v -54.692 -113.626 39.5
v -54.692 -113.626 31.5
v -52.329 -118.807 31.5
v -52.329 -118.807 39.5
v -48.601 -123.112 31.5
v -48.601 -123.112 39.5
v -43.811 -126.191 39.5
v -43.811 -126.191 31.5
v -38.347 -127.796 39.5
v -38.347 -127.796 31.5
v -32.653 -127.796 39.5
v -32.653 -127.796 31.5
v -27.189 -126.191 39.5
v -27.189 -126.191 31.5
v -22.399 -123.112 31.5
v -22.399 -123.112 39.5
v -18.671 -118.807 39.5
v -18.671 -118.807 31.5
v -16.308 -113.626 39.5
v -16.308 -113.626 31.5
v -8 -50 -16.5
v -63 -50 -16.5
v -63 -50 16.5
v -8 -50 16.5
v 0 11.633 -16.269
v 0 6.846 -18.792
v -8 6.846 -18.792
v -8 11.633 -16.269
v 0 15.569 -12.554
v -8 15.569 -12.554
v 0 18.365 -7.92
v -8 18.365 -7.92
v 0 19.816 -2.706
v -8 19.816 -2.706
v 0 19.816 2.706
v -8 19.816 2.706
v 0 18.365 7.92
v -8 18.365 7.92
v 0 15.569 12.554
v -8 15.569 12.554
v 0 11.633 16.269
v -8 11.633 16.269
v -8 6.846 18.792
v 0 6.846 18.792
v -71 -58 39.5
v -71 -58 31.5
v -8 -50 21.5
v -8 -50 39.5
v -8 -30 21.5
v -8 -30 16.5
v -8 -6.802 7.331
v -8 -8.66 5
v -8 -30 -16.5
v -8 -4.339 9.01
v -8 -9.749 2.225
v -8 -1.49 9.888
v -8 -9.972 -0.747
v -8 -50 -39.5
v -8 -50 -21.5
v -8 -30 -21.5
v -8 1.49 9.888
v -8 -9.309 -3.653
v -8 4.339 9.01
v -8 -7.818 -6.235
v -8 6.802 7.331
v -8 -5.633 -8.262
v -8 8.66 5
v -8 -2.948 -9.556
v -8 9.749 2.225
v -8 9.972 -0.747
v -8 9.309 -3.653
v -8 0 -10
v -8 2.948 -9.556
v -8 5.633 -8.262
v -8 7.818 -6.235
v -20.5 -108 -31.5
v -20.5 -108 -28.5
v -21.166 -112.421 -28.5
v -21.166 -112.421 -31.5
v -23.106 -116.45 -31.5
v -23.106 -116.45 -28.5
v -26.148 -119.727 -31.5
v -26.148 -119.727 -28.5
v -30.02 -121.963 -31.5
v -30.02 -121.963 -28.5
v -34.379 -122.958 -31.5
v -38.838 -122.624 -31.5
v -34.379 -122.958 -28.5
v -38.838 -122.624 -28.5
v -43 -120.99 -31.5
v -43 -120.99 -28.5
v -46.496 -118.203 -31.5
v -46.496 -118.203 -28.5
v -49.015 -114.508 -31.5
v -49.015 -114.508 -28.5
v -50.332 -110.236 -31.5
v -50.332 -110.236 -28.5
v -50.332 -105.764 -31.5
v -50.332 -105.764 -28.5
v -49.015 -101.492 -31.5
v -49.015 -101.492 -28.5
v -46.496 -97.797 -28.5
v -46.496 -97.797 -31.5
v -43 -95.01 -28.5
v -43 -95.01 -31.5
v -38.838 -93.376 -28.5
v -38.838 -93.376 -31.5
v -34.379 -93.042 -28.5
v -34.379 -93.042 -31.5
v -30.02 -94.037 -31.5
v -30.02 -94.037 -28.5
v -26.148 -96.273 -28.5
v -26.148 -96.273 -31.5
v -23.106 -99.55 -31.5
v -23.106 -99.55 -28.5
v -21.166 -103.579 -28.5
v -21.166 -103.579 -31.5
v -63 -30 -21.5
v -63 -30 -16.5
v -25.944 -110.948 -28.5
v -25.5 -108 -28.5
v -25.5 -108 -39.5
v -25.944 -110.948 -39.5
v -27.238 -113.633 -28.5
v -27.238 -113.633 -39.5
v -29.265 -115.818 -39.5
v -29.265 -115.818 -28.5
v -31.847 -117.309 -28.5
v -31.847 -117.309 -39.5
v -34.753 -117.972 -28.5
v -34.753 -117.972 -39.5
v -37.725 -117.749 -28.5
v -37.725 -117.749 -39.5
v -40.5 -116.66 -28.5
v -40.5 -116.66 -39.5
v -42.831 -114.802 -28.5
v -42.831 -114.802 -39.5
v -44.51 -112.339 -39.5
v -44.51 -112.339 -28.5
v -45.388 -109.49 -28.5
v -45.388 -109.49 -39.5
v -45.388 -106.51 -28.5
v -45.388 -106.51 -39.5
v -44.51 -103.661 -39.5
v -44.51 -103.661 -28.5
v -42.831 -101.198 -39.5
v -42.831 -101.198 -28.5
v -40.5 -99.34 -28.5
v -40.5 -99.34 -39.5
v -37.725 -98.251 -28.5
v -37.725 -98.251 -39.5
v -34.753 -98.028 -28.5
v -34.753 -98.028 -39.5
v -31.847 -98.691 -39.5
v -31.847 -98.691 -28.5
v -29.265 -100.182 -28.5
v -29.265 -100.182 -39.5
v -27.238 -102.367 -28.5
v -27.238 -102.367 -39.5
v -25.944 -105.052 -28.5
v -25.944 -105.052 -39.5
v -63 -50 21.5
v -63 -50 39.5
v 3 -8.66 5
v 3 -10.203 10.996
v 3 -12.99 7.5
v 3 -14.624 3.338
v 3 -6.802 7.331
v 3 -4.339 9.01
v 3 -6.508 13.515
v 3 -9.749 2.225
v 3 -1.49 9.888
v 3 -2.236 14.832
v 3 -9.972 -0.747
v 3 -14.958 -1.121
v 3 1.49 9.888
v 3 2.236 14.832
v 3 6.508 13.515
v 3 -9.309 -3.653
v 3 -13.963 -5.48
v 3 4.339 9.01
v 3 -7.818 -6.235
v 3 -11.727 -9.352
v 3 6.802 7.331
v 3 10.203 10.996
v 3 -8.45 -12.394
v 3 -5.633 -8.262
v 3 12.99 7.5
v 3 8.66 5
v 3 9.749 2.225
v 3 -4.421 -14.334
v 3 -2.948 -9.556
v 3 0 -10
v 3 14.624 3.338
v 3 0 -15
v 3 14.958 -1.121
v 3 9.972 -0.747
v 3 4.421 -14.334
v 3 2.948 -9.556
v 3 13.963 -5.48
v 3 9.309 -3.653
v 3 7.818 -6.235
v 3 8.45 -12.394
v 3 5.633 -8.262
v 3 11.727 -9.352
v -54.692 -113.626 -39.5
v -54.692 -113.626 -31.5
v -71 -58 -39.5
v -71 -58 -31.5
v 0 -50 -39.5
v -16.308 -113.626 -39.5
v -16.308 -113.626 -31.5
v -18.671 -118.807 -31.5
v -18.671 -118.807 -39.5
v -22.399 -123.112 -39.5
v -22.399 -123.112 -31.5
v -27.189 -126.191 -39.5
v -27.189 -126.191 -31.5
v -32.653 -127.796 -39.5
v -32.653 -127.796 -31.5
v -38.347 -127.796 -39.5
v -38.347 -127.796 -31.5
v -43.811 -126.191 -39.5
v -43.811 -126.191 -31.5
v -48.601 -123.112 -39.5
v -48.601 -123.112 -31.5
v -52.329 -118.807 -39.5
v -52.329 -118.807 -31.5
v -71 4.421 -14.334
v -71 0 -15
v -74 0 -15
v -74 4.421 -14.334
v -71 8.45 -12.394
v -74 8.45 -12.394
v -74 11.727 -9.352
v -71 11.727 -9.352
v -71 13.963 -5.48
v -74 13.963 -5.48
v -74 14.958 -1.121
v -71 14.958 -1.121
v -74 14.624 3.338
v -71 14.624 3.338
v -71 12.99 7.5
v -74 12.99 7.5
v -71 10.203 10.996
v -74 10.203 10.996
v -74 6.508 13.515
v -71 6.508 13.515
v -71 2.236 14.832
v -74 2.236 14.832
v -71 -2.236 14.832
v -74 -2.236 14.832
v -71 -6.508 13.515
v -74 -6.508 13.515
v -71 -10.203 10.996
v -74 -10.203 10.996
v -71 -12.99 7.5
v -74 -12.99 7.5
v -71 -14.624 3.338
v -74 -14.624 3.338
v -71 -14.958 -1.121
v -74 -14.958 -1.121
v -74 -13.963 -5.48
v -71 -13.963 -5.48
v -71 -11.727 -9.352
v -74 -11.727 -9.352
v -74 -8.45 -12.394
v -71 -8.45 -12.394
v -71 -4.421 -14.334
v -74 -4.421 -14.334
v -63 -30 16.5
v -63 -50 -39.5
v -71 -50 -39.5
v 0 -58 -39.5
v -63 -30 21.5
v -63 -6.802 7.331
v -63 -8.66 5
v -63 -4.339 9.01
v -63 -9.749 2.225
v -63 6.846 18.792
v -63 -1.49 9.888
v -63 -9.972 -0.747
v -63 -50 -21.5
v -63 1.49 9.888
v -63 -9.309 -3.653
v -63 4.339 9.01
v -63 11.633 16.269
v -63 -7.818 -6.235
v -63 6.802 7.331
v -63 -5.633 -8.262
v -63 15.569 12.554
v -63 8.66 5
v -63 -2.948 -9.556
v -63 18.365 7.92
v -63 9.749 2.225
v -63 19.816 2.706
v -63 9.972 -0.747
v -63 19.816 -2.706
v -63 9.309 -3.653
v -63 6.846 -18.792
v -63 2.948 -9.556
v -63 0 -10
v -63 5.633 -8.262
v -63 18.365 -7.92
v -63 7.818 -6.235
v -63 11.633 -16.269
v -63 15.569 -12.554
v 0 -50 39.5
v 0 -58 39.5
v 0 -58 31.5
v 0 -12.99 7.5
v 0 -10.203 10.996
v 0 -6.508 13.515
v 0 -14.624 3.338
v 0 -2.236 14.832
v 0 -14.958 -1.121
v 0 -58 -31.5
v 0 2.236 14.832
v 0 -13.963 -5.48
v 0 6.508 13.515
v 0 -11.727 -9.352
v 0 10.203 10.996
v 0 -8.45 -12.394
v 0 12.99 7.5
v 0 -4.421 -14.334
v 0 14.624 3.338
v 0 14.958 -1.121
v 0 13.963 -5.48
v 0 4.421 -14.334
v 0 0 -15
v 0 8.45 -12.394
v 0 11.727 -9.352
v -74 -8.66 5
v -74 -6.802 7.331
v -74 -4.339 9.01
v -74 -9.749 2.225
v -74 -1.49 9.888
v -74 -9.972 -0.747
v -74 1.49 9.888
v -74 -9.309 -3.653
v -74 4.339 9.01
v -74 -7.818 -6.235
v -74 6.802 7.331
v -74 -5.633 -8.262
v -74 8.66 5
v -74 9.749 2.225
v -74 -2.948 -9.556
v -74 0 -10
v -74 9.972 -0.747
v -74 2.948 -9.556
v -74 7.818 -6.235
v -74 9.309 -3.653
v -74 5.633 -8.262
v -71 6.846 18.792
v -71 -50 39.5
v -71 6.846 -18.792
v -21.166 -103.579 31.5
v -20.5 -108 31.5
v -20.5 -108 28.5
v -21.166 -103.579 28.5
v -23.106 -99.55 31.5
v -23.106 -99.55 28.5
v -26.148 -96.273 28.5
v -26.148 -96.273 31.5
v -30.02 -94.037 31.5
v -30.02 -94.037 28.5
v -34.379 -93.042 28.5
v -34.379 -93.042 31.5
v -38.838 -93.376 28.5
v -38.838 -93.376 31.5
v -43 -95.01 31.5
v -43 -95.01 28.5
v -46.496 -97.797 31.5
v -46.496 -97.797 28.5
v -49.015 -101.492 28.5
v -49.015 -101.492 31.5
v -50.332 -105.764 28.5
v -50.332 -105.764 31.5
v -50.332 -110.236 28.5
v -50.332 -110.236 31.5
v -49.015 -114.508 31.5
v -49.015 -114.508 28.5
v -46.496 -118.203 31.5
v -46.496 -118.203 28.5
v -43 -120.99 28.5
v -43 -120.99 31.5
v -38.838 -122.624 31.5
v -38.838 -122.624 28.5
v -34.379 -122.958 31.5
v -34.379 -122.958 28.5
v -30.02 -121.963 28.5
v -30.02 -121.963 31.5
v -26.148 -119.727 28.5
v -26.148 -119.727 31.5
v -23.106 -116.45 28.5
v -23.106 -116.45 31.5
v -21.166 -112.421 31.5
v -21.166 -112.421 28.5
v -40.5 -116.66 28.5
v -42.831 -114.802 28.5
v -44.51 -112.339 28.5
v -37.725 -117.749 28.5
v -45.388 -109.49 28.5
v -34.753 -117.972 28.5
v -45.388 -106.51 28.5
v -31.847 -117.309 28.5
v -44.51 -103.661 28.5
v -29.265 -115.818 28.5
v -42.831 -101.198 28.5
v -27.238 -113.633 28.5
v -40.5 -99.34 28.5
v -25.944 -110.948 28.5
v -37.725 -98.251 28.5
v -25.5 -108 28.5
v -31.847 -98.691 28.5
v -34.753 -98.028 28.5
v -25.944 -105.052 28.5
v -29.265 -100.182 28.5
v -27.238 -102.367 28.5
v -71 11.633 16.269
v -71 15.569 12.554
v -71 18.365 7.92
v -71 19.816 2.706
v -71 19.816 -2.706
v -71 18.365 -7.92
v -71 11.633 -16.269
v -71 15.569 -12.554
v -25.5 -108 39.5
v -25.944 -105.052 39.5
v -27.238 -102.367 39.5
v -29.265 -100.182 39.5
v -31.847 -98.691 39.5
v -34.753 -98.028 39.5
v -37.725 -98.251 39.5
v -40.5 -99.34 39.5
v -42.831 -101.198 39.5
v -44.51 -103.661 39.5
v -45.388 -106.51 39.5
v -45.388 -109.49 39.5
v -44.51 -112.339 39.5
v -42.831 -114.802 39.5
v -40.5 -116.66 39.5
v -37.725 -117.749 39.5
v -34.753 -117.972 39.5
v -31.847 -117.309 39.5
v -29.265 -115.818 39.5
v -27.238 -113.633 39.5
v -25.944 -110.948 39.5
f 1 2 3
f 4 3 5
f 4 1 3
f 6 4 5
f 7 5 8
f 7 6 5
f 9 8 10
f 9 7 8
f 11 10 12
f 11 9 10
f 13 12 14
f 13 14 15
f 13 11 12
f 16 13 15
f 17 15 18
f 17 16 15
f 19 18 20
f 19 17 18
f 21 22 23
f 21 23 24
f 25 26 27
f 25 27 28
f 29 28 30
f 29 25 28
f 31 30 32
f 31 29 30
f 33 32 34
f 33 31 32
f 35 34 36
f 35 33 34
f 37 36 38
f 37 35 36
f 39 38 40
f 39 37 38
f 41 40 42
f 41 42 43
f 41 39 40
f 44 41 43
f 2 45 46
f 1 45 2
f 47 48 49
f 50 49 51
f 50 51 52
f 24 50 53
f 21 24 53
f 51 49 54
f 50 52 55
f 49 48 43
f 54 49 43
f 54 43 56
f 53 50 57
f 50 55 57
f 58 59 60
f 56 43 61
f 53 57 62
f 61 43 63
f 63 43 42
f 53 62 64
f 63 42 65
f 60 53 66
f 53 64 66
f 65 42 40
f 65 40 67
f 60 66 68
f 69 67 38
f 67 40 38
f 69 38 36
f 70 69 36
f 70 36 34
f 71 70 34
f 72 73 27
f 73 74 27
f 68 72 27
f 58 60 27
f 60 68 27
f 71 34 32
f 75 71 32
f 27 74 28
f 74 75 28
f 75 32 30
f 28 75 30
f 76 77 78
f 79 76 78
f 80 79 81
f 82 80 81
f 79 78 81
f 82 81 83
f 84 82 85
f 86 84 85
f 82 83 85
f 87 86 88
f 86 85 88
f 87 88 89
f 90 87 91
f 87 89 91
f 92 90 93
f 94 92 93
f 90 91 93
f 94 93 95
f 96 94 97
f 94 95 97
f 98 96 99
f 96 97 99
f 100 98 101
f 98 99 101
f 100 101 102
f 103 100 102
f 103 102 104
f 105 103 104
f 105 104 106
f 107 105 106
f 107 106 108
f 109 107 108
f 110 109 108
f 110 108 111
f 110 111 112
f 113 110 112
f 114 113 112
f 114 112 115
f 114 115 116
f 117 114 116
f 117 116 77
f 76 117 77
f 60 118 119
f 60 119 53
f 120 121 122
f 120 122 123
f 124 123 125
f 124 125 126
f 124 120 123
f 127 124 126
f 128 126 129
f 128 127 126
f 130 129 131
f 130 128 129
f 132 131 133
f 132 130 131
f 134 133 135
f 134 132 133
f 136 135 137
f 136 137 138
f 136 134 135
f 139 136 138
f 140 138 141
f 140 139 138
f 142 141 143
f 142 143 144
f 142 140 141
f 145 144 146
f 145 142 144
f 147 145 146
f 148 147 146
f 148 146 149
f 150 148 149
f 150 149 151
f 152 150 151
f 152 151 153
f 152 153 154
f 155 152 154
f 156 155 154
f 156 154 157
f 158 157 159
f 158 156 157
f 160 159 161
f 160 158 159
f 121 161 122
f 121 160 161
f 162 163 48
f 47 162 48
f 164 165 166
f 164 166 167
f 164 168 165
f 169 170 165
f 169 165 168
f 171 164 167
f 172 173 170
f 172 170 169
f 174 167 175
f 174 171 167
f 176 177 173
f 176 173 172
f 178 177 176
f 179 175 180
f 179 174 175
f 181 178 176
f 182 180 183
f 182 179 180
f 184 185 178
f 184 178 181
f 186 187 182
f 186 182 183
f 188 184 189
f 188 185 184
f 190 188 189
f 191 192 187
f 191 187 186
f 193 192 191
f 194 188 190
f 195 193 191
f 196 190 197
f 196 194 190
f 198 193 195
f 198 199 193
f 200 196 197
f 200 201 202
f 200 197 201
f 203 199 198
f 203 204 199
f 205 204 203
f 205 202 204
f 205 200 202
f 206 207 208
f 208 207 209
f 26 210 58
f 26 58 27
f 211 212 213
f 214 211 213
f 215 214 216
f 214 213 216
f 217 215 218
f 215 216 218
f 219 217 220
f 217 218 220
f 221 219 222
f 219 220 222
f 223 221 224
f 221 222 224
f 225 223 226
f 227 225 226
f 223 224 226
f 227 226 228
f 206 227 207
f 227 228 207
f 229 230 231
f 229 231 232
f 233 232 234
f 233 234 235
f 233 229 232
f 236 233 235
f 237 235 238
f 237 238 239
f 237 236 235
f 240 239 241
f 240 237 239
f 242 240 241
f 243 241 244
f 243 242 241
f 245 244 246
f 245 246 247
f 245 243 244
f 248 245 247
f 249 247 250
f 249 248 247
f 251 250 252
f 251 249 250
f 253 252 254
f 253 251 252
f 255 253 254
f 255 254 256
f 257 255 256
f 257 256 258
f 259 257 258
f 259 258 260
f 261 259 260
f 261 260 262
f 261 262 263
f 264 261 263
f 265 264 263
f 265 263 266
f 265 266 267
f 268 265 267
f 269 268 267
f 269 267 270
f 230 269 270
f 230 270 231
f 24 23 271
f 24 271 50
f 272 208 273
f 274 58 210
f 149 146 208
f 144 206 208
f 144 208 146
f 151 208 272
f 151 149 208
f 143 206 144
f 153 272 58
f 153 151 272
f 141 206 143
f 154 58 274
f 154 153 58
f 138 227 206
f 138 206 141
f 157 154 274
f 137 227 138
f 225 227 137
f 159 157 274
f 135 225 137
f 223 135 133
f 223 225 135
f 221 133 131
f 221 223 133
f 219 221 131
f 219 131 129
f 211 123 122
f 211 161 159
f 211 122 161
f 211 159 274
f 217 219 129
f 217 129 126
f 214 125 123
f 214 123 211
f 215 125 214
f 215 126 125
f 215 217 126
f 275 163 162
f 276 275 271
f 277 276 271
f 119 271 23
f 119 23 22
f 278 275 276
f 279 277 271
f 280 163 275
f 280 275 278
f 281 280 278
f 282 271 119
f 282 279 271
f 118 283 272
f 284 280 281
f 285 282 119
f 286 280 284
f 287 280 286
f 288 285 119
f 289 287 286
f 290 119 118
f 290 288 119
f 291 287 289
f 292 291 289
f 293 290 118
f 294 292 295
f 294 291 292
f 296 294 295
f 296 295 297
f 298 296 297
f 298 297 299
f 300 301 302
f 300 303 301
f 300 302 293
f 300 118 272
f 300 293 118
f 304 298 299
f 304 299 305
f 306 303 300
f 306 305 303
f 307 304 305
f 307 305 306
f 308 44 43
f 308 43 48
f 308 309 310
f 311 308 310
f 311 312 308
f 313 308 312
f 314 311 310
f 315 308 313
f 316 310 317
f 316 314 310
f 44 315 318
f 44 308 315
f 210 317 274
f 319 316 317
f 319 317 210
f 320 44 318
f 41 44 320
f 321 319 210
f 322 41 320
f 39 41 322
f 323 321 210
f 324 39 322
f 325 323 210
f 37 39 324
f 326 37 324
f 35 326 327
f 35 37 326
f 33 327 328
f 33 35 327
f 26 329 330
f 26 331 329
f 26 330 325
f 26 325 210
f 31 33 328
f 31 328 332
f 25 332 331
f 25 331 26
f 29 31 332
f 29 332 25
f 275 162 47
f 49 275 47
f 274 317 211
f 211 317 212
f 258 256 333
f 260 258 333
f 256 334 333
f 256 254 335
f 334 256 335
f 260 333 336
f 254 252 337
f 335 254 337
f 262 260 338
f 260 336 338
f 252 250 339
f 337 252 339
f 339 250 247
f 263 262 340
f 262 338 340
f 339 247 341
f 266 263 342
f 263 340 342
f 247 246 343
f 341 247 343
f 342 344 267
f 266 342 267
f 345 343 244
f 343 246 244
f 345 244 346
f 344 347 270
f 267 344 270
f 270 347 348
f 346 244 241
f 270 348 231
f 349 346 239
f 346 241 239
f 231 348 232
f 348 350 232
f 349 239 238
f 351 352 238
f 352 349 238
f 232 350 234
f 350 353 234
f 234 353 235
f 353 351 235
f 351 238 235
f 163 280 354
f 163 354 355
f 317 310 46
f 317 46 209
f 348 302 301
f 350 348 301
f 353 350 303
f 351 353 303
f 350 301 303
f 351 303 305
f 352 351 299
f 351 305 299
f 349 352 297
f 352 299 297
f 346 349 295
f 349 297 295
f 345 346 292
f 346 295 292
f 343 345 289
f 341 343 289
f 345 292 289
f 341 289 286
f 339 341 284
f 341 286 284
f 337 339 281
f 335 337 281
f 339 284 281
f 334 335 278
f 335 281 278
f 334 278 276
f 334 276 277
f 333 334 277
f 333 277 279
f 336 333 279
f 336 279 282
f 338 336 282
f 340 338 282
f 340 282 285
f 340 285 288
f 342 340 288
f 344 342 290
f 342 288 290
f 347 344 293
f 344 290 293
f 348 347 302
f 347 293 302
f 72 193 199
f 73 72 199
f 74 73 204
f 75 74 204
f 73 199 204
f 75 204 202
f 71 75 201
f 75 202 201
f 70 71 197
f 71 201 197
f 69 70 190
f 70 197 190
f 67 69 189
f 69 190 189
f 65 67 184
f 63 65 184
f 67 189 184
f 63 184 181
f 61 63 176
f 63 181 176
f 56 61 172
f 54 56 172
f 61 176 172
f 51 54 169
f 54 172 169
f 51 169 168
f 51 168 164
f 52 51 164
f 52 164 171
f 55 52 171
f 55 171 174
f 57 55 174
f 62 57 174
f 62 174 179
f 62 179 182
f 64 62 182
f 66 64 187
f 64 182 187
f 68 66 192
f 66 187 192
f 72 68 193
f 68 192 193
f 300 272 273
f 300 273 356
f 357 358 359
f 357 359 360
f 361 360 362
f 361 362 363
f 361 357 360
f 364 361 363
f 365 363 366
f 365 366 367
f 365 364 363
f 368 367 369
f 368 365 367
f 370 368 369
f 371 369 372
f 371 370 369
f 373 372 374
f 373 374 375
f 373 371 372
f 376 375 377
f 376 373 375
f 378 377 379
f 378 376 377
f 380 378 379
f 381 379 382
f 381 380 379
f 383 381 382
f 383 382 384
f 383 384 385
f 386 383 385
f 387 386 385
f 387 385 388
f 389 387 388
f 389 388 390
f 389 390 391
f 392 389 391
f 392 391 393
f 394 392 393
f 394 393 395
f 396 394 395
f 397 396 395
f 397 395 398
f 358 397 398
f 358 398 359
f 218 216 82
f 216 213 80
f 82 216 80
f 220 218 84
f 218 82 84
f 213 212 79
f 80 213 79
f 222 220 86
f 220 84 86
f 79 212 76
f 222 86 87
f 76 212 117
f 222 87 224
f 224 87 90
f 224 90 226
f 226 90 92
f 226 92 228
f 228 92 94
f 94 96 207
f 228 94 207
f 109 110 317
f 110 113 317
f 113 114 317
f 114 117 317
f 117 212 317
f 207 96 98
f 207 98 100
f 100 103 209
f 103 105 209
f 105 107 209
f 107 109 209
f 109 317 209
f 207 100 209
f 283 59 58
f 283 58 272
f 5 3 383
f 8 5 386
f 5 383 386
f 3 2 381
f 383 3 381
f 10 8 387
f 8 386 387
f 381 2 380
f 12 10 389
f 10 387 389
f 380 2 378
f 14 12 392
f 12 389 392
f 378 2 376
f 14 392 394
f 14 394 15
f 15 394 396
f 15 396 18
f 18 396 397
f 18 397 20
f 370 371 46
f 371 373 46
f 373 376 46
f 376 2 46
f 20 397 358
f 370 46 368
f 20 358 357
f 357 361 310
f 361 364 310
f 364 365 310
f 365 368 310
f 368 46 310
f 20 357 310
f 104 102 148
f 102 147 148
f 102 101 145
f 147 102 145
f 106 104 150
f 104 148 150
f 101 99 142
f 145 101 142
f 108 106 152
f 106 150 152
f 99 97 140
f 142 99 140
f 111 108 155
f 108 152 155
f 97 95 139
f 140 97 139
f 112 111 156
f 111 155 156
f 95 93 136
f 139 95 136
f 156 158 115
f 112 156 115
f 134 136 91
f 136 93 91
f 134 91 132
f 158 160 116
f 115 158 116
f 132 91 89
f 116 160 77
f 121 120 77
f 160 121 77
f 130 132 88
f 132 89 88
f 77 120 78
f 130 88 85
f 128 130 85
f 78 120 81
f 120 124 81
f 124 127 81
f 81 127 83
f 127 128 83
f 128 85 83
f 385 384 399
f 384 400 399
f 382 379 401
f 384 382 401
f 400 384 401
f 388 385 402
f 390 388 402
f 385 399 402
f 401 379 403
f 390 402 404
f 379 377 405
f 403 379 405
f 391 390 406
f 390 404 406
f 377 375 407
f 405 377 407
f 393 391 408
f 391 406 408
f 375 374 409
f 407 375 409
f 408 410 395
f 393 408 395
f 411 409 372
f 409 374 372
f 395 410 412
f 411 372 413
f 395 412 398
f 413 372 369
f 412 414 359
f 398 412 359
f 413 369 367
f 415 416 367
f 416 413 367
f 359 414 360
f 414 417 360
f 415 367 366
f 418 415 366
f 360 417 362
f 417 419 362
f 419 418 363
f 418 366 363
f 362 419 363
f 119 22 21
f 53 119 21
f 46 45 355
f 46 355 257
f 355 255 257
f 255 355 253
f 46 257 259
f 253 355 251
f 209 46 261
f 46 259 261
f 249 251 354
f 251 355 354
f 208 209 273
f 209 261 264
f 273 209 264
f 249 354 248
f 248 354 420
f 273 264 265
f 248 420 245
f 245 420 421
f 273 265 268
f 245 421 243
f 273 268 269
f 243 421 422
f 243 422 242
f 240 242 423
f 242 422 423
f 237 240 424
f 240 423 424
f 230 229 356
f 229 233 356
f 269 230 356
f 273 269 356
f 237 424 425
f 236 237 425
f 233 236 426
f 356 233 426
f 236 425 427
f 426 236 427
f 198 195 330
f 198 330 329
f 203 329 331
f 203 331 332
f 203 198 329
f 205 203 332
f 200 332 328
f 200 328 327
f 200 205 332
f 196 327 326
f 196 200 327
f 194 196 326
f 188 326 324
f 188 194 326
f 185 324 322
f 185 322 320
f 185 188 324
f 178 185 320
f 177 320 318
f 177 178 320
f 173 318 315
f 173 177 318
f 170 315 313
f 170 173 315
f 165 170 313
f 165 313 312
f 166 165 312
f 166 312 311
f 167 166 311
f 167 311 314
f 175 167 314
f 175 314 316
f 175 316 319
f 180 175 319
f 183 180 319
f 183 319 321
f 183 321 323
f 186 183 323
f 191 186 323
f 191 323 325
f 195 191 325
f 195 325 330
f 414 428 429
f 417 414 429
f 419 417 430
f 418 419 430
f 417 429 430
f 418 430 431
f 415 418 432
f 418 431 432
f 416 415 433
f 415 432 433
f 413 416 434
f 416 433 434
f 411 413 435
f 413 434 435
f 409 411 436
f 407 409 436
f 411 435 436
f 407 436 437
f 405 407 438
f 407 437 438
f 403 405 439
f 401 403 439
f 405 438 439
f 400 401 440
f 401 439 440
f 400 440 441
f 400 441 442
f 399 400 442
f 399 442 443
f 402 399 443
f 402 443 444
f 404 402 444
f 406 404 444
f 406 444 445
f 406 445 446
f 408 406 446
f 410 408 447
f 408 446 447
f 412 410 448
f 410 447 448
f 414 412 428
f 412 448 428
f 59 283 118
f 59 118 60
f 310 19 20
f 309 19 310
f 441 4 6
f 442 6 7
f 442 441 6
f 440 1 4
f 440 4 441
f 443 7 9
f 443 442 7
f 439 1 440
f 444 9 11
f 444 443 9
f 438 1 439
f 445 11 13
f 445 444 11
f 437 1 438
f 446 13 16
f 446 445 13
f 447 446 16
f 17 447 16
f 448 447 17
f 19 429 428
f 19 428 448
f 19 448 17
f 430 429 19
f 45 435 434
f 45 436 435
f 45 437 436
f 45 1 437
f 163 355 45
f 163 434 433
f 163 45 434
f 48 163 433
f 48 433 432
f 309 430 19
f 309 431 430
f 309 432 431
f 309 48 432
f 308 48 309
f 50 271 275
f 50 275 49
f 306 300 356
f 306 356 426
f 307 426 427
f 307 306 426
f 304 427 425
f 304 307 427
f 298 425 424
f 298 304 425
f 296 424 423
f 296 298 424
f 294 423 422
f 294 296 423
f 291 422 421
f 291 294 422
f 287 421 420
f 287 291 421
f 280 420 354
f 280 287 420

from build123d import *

# Parameters (mm, degrees)
SKETCH1_R                 = 15
BOSS_EXTRUDE1_DEPTH       = 8
BOSS_EXTRUDE2_START       = 3
SKETCH1_3_R               = 15
SKETCH1_3_R_2             = 10
BOSS_EXTRUDE2_DEPTH       = 11
BOSS_EXTRUDE3_START       = -63
SKETCH1_4_R               = 15
BOSS_EXTRUDE3_DEPTH       = 8
LPATTERN3_COUNT           = 2
LPATTERN3_PITCH           = 66
SKETCH3_R                 = 15
BOSS_EXTRUDE7_DEPTH       = 8
SKETCH3_7_R               = 15
SKETCH3_7_R_2             = 10
BOSS_EXTRUDE8_DEPTH       = 11
BOSS_EXTRUDE9_START       = -8
SKETCH4_R                 = 15
BOSS_EXTRUDE9_DEPTH       = 8
BOSS_EXTRUDE10_START      = -11
SKETCH4_4_R               = 15
SKETCH4_4_R_2             = 10
BOSS_EXTRUDE10_DEPTH      = 11
SKETCH5_W                 = 55
SKETCH5_H                 = 18
SKETCH5_H_2               = 33
BOSS_EXTRUDE11_DEPTH      = 8
BOSS_EXTRUDE13_DEPTH      = 20
BOSS_EXTRUDE13_DEPTH_BACK = 8
SKETCH5_3_W               = 55
SKETCH5_3_H               = 5


with BuildPart() as part:
    # Sketch1 → Boss-Extrude1 (new body)
    with BuildSketch(Plane(origin=(0, 0, 0), x_dir=(0, 0, -1), z_dir=(1, 0, 0))):
        with BuildLine():
            Line((-18.791946309, 6.845637584), (-39.5, -50))
            Line((-39.5, -50), (-39.5, -58))
            Line((-39.5, -58), (39.5, -58))
            Line((39.5, -58), (39.5, -50))
            Line((39.5, -50), (18.791946309, 6.845637584))
            ThreePointArc((18.791946309, 6.845637584), (0, 20), (-18.791946309, 6.845637584))
        make_face()
        Circle(SKETCH1_R, mode=Mode.SUBTRACT)
    extrude(amount=-BOSS_EXTRUDE1_DEPTH)

    # Sketch1<3> → Boss-Extrude2 (add)
    with BuildSketch(Plane(origin=(0, 0, 0), x_dir=(0, 0, -1), z_dir=(1, 0, 0)).offset(BOSS_EXTRUDE2_START)):
        Circle(SKETCH1_3_R)
        Circle(SKETCH1_3_R_2, mode=Mode.SUBTRACT)
    boss_extrude2 = extrude(amount=-BOSS_EXTRUDE2_DEPTH)



with BuildPart() as body_2:
    # Sketch1<4> → Boss-Extrude3 (new body)
    with BuildSketch(Plane(origin=(0, 0, 0), x_dir=(0, 0, -1), z_dir=(1, 0, 0)).offset(BOSS_EXTRUDE3_START)):
        with BuildLine():
            Line((-18.791946309, 6.845637584), (-39.5, -50))
            Line((-39.5, -50), (-39.5, -58))
            Line((-39.5, -58), (39.5, -58))
            Line((39.5, -58), (39.5, -50))
            Line((39.5, -50), (18.791946309, 6.845637584))
            ThreePointArc((18.791946309, 6.845637584), (0, 20), (-18.791946309, 6.845637584))
        make_face()
        Circle(SKETCH1_4_R, mode=Mode.SUBTRACT)
    extrude(amount=-BOSS_EXTRUDE3_DEPTH)

    # LPattern3: Boss-Extrude2 ×2
    with Locations(*[(-i * LPATTERN3_PITCH, 0, 0) for i in range(1, LPATTERN3_COUNT)]):
        add(boss_extrude2)


with BuildPart() as part_1:
    add(part.part)

    add(body_2.part)  # Boss-Extrude7 merges body 2
    # Sketch3 → Boss-Extrude7 (add)
    with BuildSketch(Plane.XY.offset(39.5)):
        with BuildLine():
            Line((-16.307748581, -113.626498508), (0, -58))
            Line((0, -58), (0, -50))
            Line((0, -50), (-71, -50))
            Line((-71, -50), (-71, -58))
            Line((-71, -58), (-54.692251419, -113.626498508))
            ThreePointArc((-54.692251419, -113.626498508), (-35.5, -128), (-16.307748581, -113.626498508))
        make_face()
        with Locations((-35.5, -108)):
            Circle(SKETCH3_R, mode=Mode.SUBTRACT)
    extrude(amount=-BOSS_EXTRUDE7_DEPTH)

    # Sketch3<7> → Boss-Extrude8 (add)
    with BuildSketch(Plane.XY.offset(39.5)):
        with Locations((-35.5, -108)):
            Circle(SKETCH3_7_R)
        with Locations((-35.5, -108)):
            Circle(SKETCH3_7_R_2, mode=Mode.SUBTRACT)
    extrude(amount=-BOSS_EXTRUDE8_DEPTH)

    # Sketch4 → Boss-Extrude9 (add)
    with BuildSketch(Plane(origin=(0, 0, -39.5), x_dir=(-1, 0, 0), z_dir=(0, 0, -1)).offset(BOSS_EXTRUDE9_START)):
        with BuildLine():
            Line((54.692251419, -113.626498508), (71, -58))
            Line((71, -58), (71, -50))
            Line((71, -50), (0, -50))
            Line((0, -50), (0, -58))
            Line((0, -58), (16.307748581, -113.626498508))
            ThreePointArc((16.307748581, -113.626498508), (35.5, -128), (54.692251419, -113.626498508))
        make_face()
        with Locations((35.5, -108)):
            Circle(SKETCH4_R, mode=Mode.SUBTRACT)
    extrude(amount=BOSS_EXTRUDE9_DEPTH)

    # Sketch4<4> → Boss-Extrude10 (add)
    with BuildSketch(Plane(origin=(0, 0, -39.5), x_dir=(-1, 0, 0), z_dir=(0, 0, -1)).offset(BOSS_EXTRUDE10_START)):
        with Locations((35.5, -108)):
            Circle(SKETCH4_4_R)
        with Locations((35.5, -108)):
            Circle(SKETCH4_4_R_2, mode=Mode.SUBTRACT)
    extrude(amount=BOSS_EXTRUDE10_DEPTH)

    # Sketch5 → Boss-Extrude11 (add)
    with BuildSketch(Plane(origin=(0, -50, 0), x_dir=(1, 0, 0), z_dir=(0, 1, 0))):
        with Locations((-35.5, 30.5)):
            Rectangle(SKETCH5_W, SKETCH5_H)
        with Locations((-35.5, 0)):
            Rectangle(SKETCH5_W, SKETCH5_H_2)
        with Locations((-35.5, -30.5)):
            Rectangle(SKETCH5_W, SKETCH5_H)
    extrude(amount=-BOSS_EXTRUDE11_DEPTH)

    # Sketch5<3> → Boss-Extrude13 (add, two sides: drawn at the far end of the back side and taken through both)
    with BuildSketch(Plane(origin=(0, -50, 0), x_dir=(1, 0, 0), z_dir=(0, 1, 0)).offset(-BOSS_EXTRUDE13_DEPTH_BACK)):
        with Locations((-35.5, 19)):
            Rectangle(SKETCH5_3_W, SKETCH5_3_H)
        with Locations((-35.5, -19)):
            Rectangle(SKETCH5_3_W, SKETCH5_3_H)
    extrude(amount=BOSS_EXTRUDE13_DEPTH + BOSS_EXTRUDE13_DEPTH_BACK)


solid = part_1.part
